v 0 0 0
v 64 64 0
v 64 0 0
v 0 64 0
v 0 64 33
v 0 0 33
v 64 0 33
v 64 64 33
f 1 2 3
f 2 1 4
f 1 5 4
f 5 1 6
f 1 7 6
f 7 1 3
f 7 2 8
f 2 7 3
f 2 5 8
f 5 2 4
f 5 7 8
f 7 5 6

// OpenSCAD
// file: ModularDungeonTileLibrary.scad
//Constants
wallleft = 0;
wallbottom = 1;
wallright = 2;
walltop = 3;
wallcenter = 4;
walldoubleright = 5;


//Variables
size = 32;
connectorlength = size-10;
connectorwidth = 6;
connectorheight = 4;
baseheight = 8;
topperheight = 2;
topperrounded = true;
walllength = size;
wallheight = 25;
wallwidth = 6;
wallwidththin = 4;


//Functions
function hypotenuse_ra(side_a, side_b) =
    sqrt(pow(side_a, 2) + pow(side_b, 2));
    
    
//Modules    
module mtdl_Base_Connector(cw,cl,ch) {
    translate([-connectorwidth/2,-connectorlength/2,-connectorheight/2]) {
        cube([cw,cl,ch/2]);
        translate([cw/3,0,ch/2])
            cube([cw/3,cl,ch/2]);
        translate([-(cw-2)/2,cl/2-2,0])
            cube([cw+4,4,ch]);
    }
}

module mdtl_Base(s,bh)
{
    cube([s,s,bh]);
}

module mdtl_Topper(s,bh,th,tr)
{
    if (tr) {
        translate([0,0,bh])
            intersection() {
                difference () {
                        cube([s,s,th]);
                        union () {
                        rotate(a=45, v=[1,0,0])
                            cube([s,th*2,th*2]);
                        translate([0,s,0])
                            rotate(a=45, v=[1,0,0])
                                cube([s,th*2,th*2]);
                        rotate(a=-45, v=[0,1,0])
                            cube([th*2,s,th*2]);
                        translate([s,0,0])
                            rotate(a=-45, v=[0,1,0])
                                cube([th*2,s,th*2]);
                        }
                }
                translate([s/2,s/2,0])
                    cylinder(
                        h=th, 
                        r1=hypotenuse_ra(s/2-1.2, s/2-1.2), 
                        r2=hypotenuse_ra(s/2-th-.8, s/2-th-.8), 
                        center=false, 
                        $fa=.1);
            }    
    }
    else {
        translate([0,0,bh])
            difference() {
                cube([s,s,th]);
                union () {
                rotate(a=45, v=[1,0,0])
                    cube([s,th*2,th*2]);
                translate([0,s,0])
                    rotate(a=45, v=[1,0,0])
                        cube([s,th*2,th*2]);
                rotate(a=-45, v=[0,1,0])
                    cube([th*2,s,th*2]);
                translate([s,0,0])
                    rotate(a=-45, v=[0,1,0])
                        cube([th*2,s,th*2]);
                }
            }    
    }
}

module mdtl_Base_1x1(s,bh,th,tr) 
{
    difference () {
        union () {
            mdtl_Base(s,bh);
            mdtl_Topper(s,bh,th,tr);
        }
//        union () {
//            translate([size/2,size,baseheight/2])
//                rotate([0,180,0])
//                    mtdl_Base_Connector(connectorwidth,connectorlength,connectorheight);
//            translate([size/2,0,baseheight/2])
//                rotate([0,180,0])
//                    mtdl_Base_Connector(connectorwidth,connectorlength,connectorheight);
//            translate([size,size/2,baseheight/2])
//                rotate([0,180,90])
//                    mtdl_Base_Connector(connectorwidth,connectorlength,connectorheight);
//            translate([0,size/2,baseheight/2])
//                rotate([0,180,90])
//                    mtdl_Base_Connector(connectorwidth,connectorlength,connectorheight);
//        }
    }
}

module mdtl_Base_1x2(s,bh,th,tr)
{
    union () {
        mdtl_Base_1x1(s,bh,th,tr);
        translate([s,0,0])
            mdtl_Base_1x1(s,bh,th,tr);
    }
}
 
module mdtl_Base_2x2(s,bh,th,tr)
{
    union () {
        mdtl_Base_1x2(s,bh,th,tr);
        translate([0,s,0])
            mdtl_Base_1x2(s,bh,th,tr);
    }
}
 
module mdtl_Base_2x4(s,bh,th,tr)
{
    union () {
        mdtl_Base_2x2(s,bh,th,tr);
        translate([s*2,0,0])
            mdtl_Base_2x2(s,bh,th,tr);
    }
}
 
module mdtl_Base_4x4(s,bh,th,tr)
{
    union () {
        mdtl_Base_2x4(s,bh,th,tr);
        translate([0,s*2,0])
            mdtl_Base_2x4(s,bh,th,tr);
    }
}
 
module mdtl_Wall_1(w,l,h)
{
    translate([0,0,baseheight])
        cube([w,l,h]);   
}

module mdtl_Wall_1_Position(w,l,h,p)
{
    if (p==0) {
        mdtl_Wall_1(w,l,h);
    }
    
    else if (p==1) {
        rotate(a=-90)
           translate([-w,0,0])
               mdtl_Wall_1(w,l,h);       
    }
    
    else if (p==2) {
        translate([(size)-w,0,0])
            mdtl_Wall_1(w,l,h);
    }
    
    else if (p==3) {
        rotate(a=-90)
            translate([-l,0,0])
                mdtl_Wall_1(w,l,h);
    }
    
    else if (p==4) {
        translate([(size)-w/2,0,0])
            mdtl_Wall_1(w,l,h);
    }
    
    else if (p==5) {
        translate([(size*2)-w,0,0])
           mdtl_Wall_1(w,l,h);       
    }
}

module mdtl_Wall_2(w,l,h)
{
    union() {
        mdtl_Wall_1(w,l,h);
        translate([0,l,0])
            mdtl_Wall_1(w,l,h);
    }
}

module mdtl_Wall_2_Position(w,l,h,p)
{
    if (p==0) {
        mdtl_Wall_2(w,l,h);
    }
    
    else if (p==1) {
        rotate(a=-90)
            translate([-w,0,0])
                mdtl_Wall_2(w,l,h);
    }
    
    else if (p==2) {
    translate([(size*2)-w,0,0])
        mdtl_Wall_2(w,l,h);
    }
    
    else if (p==3) {
        rotate(a=-90)
            translate([-l*2,0,0])
                mdtl_Wall_2(w,l,h);
    }
    
    else if (p==4) {
        translate([(size)-w/2,0,0])
            mdtl_Wall_2(w,l,h);
    }
}
// main file
include <ModularDungeonTileLibrary.scad>; 

mdtl_Base_2x2(size,baseheight,topperheight,topperrounded);
//Create Pillar with modified wall
mdtl_Wall_2_Position(size,size,wallheight,wallleft);
mdtl_Wall_2_Position(size,size,wallheight,wallright);
